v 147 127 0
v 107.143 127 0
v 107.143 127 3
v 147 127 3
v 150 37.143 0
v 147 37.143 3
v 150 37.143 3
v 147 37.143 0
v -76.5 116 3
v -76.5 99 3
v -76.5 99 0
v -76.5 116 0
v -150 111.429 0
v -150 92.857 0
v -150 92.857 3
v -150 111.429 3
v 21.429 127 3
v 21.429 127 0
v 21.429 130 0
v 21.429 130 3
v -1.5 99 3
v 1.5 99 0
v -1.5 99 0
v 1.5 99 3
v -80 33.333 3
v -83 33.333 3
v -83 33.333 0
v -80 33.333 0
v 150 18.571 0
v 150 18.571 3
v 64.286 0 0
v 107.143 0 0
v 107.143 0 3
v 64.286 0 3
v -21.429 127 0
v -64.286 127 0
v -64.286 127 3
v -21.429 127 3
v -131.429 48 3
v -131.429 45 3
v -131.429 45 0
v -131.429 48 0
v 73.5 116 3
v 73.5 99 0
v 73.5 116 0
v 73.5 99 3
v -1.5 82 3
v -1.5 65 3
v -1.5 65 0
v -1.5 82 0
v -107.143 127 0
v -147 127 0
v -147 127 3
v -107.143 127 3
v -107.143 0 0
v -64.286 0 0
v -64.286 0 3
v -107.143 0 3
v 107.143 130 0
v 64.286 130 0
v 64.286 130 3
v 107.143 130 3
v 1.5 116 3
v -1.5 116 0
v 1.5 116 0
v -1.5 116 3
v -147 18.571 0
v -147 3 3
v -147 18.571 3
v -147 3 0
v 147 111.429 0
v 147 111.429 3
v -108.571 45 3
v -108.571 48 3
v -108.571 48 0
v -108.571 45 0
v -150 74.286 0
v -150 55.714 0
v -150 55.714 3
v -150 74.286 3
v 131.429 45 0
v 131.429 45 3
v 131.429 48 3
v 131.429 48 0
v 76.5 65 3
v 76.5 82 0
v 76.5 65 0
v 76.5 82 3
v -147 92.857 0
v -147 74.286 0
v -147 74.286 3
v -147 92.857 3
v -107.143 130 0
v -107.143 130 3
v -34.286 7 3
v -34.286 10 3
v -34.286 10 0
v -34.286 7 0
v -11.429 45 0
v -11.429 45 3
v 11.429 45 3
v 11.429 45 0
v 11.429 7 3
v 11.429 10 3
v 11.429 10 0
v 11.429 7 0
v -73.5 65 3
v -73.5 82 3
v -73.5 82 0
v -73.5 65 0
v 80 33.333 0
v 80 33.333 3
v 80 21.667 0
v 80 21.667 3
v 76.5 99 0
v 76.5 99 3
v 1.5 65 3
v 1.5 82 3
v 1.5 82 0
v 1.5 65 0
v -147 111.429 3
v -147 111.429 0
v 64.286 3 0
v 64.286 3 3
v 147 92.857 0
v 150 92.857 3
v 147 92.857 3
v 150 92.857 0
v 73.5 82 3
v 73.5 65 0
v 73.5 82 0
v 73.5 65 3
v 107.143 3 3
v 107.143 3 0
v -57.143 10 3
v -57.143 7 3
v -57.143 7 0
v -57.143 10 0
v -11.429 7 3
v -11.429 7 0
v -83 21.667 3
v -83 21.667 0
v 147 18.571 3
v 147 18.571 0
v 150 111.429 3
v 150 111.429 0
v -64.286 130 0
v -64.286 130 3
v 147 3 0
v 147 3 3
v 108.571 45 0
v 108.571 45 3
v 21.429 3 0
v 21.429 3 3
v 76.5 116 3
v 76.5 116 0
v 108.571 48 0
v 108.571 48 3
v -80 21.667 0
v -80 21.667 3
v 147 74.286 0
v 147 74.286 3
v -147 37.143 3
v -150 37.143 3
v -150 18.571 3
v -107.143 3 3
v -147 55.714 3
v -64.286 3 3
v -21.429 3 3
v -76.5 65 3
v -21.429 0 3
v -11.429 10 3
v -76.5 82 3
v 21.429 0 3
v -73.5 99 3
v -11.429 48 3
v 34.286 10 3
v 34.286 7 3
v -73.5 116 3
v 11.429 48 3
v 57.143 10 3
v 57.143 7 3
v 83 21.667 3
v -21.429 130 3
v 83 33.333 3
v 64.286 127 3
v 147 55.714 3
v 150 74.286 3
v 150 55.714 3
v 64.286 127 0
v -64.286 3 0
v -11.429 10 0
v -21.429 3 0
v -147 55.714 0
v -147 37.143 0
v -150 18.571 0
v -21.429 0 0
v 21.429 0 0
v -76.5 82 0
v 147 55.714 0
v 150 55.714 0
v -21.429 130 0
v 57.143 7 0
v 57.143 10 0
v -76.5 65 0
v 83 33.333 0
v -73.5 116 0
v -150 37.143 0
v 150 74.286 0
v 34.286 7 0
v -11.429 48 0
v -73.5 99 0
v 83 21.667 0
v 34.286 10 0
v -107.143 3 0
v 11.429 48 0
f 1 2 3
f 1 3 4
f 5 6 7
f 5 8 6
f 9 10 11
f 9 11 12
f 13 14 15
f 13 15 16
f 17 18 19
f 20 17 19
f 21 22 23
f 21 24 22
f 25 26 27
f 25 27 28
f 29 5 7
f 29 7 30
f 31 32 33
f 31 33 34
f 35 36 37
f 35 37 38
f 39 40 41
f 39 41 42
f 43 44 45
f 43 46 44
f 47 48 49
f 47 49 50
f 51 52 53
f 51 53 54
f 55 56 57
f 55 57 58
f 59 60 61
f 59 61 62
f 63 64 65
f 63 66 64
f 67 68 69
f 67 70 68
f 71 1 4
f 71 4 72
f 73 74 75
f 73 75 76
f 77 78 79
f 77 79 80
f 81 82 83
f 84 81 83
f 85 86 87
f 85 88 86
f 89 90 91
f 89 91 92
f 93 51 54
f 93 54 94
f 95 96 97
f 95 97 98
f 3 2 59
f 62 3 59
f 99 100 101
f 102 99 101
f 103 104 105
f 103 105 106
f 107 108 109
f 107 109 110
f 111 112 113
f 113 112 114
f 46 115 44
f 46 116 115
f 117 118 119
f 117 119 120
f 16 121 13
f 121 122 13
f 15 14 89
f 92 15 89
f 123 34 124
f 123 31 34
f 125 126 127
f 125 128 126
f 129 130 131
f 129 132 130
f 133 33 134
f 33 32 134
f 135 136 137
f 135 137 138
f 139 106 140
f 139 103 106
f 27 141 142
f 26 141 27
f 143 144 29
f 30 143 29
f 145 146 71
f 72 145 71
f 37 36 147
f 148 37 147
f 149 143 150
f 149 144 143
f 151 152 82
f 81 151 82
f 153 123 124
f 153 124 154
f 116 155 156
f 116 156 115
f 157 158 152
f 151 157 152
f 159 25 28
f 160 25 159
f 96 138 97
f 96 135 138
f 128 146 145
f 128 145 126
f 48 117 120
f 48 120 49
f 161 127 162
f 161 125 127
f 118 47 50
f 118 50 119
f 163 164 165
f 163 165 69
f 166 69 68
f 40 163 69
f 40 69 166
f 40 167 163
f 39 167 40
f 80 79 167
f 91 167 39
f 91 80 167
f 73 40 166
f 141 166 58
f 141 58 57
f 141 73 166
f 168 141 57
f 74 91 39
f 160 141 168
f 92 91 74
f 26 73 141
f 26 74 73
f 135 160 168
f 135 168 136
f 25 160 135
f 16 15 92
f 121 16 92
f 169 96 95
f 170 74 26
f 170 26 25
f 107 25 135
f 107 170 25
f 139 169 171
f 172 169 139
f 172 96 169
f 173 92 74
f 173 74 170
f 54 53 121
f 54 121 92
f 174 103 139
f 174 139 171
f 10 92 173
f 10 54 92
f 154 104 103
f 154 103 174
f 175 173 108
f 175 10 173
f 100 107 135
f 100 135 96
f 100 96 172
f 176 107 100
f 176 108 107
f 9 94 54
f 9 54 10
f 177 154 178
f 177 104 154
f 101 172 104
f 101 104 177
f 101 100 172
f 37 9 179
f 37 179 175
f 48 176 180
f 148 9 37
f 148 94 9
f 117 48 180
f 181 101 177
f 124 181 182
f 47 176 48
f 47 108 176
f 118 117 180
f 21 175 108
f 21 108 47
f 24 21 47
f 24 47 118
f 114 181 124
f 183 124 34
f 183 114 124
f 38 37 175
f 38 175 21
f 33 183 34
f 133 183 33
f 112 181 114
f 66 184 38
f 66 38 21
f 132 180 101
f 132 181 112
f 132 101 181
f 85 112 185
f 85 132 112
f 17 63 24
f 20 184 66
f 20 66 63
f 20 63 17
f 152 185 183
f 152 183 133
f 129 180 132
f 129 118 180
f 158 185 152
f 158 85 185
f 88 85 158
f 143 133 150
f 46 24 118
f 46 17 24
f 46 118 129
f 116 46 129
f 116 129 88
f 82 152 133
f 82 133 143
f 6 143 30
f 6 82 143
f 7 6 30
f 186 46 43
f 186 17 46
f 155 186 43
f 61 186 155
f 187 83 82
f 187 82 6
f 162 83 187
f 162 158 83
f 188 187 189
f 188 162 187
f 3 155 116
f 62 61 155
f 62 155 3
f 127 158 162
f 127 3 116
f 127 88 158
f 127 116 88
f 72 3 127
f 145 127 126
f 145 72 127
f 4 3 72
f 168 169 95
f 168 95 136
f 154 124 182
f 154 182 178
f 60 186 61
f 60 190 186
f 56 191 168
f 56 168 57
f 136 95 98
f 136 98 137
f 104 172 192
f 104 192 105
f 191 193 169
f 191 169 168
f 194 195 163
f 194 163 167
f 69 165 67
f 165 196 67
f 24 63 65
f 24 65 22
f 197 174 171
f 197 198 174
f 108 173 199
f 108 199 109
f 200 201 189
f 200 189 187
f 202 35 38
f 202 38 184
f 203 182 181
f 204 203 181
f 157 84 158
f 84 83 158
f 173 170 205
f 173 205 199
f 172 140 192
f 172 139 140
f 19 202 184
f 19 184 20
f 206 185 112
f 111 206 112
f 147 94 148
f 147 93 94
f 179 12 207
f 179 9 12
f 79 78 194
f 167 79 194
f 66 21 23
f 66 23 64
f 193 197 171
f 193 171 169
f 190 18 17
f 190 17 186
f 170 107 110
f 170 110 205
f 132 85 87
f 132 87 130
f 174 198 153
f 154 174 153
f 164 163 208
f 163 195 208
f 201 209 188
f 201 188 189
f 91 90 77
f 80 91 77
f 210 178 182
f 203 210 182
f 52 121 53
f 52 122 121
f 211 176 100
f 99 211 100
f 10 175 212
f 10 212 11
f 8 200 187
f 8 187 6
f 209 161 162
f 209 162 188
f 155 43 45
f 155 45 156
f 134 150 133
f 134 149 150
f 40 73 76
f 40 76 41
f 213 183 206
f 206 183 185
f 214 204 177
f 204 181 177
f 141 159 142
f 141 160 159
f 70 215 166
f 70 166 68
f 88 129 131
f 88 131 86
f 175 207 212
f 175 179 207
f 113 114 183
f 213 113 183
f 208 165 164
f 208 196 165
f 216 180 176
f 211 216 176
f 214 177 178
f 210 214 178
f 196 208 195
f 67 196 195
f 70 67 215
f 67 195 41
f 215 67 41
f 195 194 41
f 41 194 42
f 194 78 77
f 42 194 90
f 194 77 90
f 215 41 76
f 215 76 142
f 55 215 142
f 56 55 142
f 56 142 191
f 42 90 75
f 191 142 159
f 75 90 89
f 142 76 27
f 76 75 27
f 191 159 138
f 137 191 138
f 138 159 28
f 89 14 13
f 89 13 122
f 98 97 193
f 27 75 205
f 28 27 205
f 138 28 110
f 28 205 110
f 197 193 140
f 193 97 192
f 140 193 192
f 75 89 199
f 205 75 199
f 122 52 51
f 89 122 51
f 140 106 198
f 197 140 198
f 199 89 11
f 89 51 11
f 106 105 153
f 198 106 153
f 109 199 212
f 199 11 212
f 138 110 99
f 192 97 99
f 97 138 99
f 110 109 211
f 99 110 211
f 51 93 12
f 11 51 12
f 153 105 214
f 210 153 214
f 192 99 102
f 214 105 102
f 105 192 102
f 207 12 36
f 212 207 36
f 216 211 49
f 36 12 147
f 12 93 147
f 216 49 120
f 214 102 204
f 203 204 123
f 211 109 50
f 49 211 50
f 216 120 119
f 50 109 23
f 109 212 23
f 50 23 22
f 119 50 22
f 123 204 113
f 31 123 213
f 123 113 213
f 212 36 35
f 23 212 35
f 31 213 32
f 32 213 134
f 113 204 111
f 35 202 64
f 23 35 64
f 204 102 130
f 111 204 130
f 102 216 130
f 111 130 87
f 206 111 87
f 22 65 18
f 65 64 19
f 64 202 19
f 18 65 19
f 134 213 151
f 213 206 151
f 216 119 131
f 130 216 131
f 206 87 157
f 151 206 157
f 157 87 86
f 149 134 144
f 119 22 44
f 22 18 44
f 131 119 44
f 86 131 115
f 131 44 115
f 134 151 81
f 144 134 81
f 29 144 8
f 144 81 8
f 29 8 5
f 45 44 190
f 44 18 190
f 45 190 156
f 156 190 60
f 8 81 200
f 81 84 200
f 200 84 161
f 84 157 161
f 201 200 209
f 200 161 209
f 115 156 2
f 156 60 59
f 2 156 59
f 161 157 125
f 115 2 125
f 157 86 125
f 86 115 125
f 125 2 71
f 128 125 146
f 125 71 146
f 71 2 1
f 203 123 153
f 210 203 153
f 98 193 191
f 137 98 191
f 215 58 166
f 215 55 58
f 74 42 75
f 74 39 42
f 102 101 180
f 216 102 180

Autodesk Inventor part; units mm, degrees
ref_plane "YZ Plane" through (0, 0, 0) normal (1, 0, 0) x (0, 1, 0)
ref_plane "XZ Plane" through (0, 0, 0) normal (0, 1, 0) x (-1, 0, 0)
ref_plane "XY Plane" through (0, 0, 0) normal (0, 0, 1) x (1, 0, 0)
sketch "Sketch1" plane through (0, 0, 0) normal (0, 0, 1) x (1, 0, 0)
  line L0 (-150, 18.5714) -> (-147, 18.5714)
  line L1 (-147, 37.1429) -> (-150, 37.1429)
  line L2 (-150, 55.7143) -> (-147, 55.7143)
  line L3 (-147, 74.2857) -> (-150, 74.2857)
  line L4 (-150, 92.8571) -> (-147, 92.8571)
  line L5 (-147, 111.4286) -> (-150, 111.4286)
  line L6 (147, 18.5714) -> (150, 18.5714)
  line L7 (147, 37.1429) -> (150, 37.1429)
  line L8 (150, 55.7143) -> (147, 55.7143)
  line L9 (147, 74.2857) -> (150, 74.2857)
  line L10 (150, 92.8571) -> (147, 92.8571)
  line L11 (150, 111.4286) -> (147, 111.4286)
  line L12 (-107.1429, 0) -> (-107.1429, 3)
  line L13 (-64.2857, 3) -> (-64.2857, 0)
  line L14 (-21.4286, 0) -> (-21.4286, 3)
  line L15 (21.4286, 0) -> (21.4286, 3)
  line L16 (64.2857, 0) -> (64.2857, 3)
  line L17 (107.1429, 0) -> (107.1429, 3)
  line L18 (-107.1429, 127) -> (-107.1429, 130)
  line L19 (-64.2857, 127) -> (-64.2857, 130)
  line L20 (-21.4286, 127) -> (-21.4286, 130)
  line L21 (21.4286, 127) -> (21.4286, 130)
  line L22 (64.2857, 127) -> (64.2857, 130)
  line L23 (107.1429, 127) -> (107.1429, 130)
  line L24 (-107.1429, 3) -> (-147, 3)
  line L25 (-147, 3) -> (-147, 18.5714)
  line L26 (-147, 37.1429) -> (-147, 55.7143)
  line L27 (-147, 74.2857) -> (-147, 92.8571)
  line L28 (-147, 111.4286) -> (-147, 127)
  line L29 (-147, 127) -> (-107.1429, 127)
  line L30 (-64.2857, 127) -> (-21.4286, 127)
  line L31 (21.4286, 127) -> (64.2857, 127)
  line L32 (107.1429, 127) -> (147, 127)
  line L33 (-21.4286, 3) -> (-64.2857, 3)
  line L34 (147, 3) -> (107.1429, 3)
  line L35 (64.2857, 3) -> (21.4286, 3)
  line L36 (-150, 92.8571) -> (-150, 111.4286)
  line L37 (-150, 18.5714) -> (-150, 37.1429)
  line L38 (-150, 55.7143) -> (-150, 74.2857)
  line L39 (-64.2857, 0) -> (-107.1429, 0)
  line L40 (107.1429, 0) -> (64.2857, 0)
  line L41 (21.4286, 0) -> (-21.4286, 0)
  line L42 (-107.1429, 130) -> (-64.2857, 130)
  line L43 (-21.4286, 130) -> (21.4286, 130)
  line L44 (64.2857, 130) -> (107.1429, 130)
  line L45 (150, 37.1429) -> (150, 18.5714)
  line L46 (150, 111.4286) -> (150, 92.8571)
  line L47 (150, 74.2857) -> (150, 55.7143)
  line L48 (147, 127) -> (147, 111.4286)
  line L49 (147, 92.8571) -> (147, 74.2857)
  line L50 (147, 55.7143) -> (147, 37.1429)
  line L51 (147, 18.5714) -> (147, 3)
  point P0 (0, 0)
  dimension "d1" = 300
  dimension "d5" = 42.8571
  dimension "d6" = 150
  dimension "d7" = 85.7143
  dimension "d8" = 128.5714
  dimension "d9" = 171.4286
  dimension "d10" = 214.2857
  dimension "d11" = 257.1429
  dimension "d12" = 130
  dimension "d13" = 18.5714
  dimension "d14" = 0
  dimension "d15" = 3
  dimension "d16" = 37.1429
  dimension "d17" = 55.7143
  dimension "d18" = 74.2857
  dimension "d19" = 92.8571
  dimension "d20" = 111.4286
  dimension "d21" = 124
  dimension "d22" = 3
  dimension "d23" = 3
extrude "Extrusion1" add sketch "Sketch1" along normal blind 3
sketch "Sketch2" plane through (0, 0, 3) normal (0, 0, 1) x (1, 0, 0)
  line L0 (-108.5714, 45) -> (-131.4286, 45)
  line L1 (-131.4286, 45) -> (-131.4286, 48)
  line L2 (-131.4286, 48) -> (-108.5714, 48)
  line L3 (-108.5714, 48) -> (-108.5714, 45)
  line L4 (-11.4286, 45) -> (11.4286, 45)
  line L5 (11.4286, 45) -> (11.4286, 48)
  line L6 (11.4286, 48) -> (-11.4286, 48)
  line L7 (-11.4286, 48) -> (-11.4286, 45)
  line L8 (108.5714, 45) -> (131.4286, 45)
  line L9 (131.4286, 45) -> (131.4286, 48)
  line L10 (131.4286, 48) -> (108.5714, 48)
  line L11 (108.5714, 48) -> (108.5714, 45)
  line L12 (-21.4286, 0) -> (21.4286, 0) projected
  line L13 (-11.4286, 10) -> (11.4286, 10)
  line L14 (11.4286, 10) -> (11.4286, 7)
  line L15 (11.4286, 7) -> (-11.4286, 7)
  line L16 (-11.4286, 7) -> (-11.4286, 10)
  line L17 (34.2857, 7) -> (57.1429, 7)
  line L18 (57.1429, 7) -> (57.1429, 10)
  line L19 (57.1429, 10) -> (34.2857, 10)
  line L20 (34.2857, 10) -> (34.2857, 7)
  line L21 (-34.2857, 7) -> (-57.1429, 7)
  line L22 (-57.1429, 7) -> (-57.1429, 10)
  line L23 (-57.1429, 10) -> (-34.2857, 10)
  line L24 (-34.2857, 10) -> (-34.2857, 7)
  line L25 (-80, 21.6667) -> (-83, 21.6667)
  line L26 (-83, 21.6667) -> (-83, 33.3333)
  line L27 (-83, 33.3333) -> (-80, 33.3333)
  line L28 (-80, 33.3333) -> (-80, 21.6667)
  line L29 (80, 21.6667) -> (83, 21.6667)
  line L30 (83, 21.6667) -> (83, 33.3333)
  line L31 (83, 33.3333) -> (80, 33.3333)
  line L32 (80, 33.3333) -> (80, 21.6667)
  point P0 (0, 0)
  point P1 (-120, 45)
  point P2 (120, 45)
  dimension "d26" = 22.8571
  dimension "d27" = 48
  dimension "d28" = 3
  dimension "d29" = 120
  dimension "d30" = 120
  dimension "d31" = 11.4286
  dimension "d34" = 7
  dimension "d35" = 3
  dimension "d36" = 22.8571
  dimension "d37" = 22.8571
  dimension "d38" = 3
  dimension "d39" = 3
  dimension "d40" = 11.6667
  dimension "d41" = 11.6667
  dimension "d42" = 22.8571
  dimension "d43" = 22.8571
extrude "Extrusion2" cut sketch "Sketch2" against normal through all
sketch "Sketch3" plane through (0, 0, 3) normal (0, 0, 1) x (1, 0, 0)
  line L0 (-76.5, 116) -> (-73.5, 116)
  line L1 (-73.5, 116) -> (-73.5, 99)
  line L2 (-73.5, 99) -> (-76.5, 99)
  line L3 (-76.5, 99) -> (-76.5, 116)
  line L4 (-76.5, 82) -> (-73.5, 82)
  line L5 (-73.5, 82) -> (-73.5, 65)
  line L6 (-73.5, 65) -> (-76.5, 65)
  line L7 (-76.5, 65) -> (-76.5, 82)
  line L8 (-21.4286, 127) -> (-64.2857, 127) projected
  line L9 (-64.2857, 127) -> (-73.5, 127) construction
  line L10 (-73.5, 127) -> (-73.5, 116) construction
  line L11 (-73.5, 99) -> (-73.5, 82) construction
  line L12 (-108.5714, 48) -> (-73.5, 48) construction
  line L13 (-73.5, 48) -> (-73.5, 65) construction
  point P0 (0, 0)
  dimension "d44" = 17
  dimension "d45" = 3
  dimension "d46" = 73.5
  dimension "d52" = 17
extrude "Extrusion3" cut sketch "Sketch3" against normal through all
pattern_linear "Rectangular Pattern1" count 3 spacing 75 along (1, 0, 0) of "Extrusion3"
equation "\"d1\" = wt"
equation "\"d5\" = 0.142857 * wt - tol"
equation "\"d6\" = 0.5 * wt"
equation "\"d7\" = 0.285714 * wt + tol"
equation "\"d8\" = 0.428571 * wt - tol"
equation "\"d9\" = 0.571429 * wt + tol"
equation "\"d10\" = 0.714286 * wt - tol"
equation "\"d11\" = 0.857143 * wt + tol"
equation "\"d12\" = height_back"
equation "\"d13\" = 0.142857 * height_back - tol"
equation "\"d15\" = tt"
equation "\"d16\" = 0.285714 * height_back + tol"
equation "\"d17\" = 0.428571 * height_back - tol"
equation "\"d18\" = 0.571429 * height_back + tol"
equation "\"d19\" = 0.714286 * height_back - tol"
equation "\"d20\" = 0.857143 * height_back + tol"
equation "\"d21\" = -2 * tt + height_back"
equation "\"d22\" = tt"
equation "\"d23\" = tt"
equation "\"d24\" = tt"
equation "\"d26\" = 0.142857 * shelfW + 2 * tol"
equation "\"d28\" = tt"
equation "\"d29\" = 0.4 * wt"
equation "\"d30\" = 0.4 * wt"
equation "\"d31\" = 0.0714286 * shelfW + tol"
equation "\"d35\" = tt"
equation "\"d36\" = 0.142857 * shelfW - 2 * tol"
equation "\"d37\" = 0.142857 * shelfW - 2 * tol"
equation "\"d38\" = tt"
equation "\"d39\" = tt"
equation "\"d40\" = 0.333333 * shelfH + 2 * tol"
equation "\"d41\" = 0.333333 * shelfH - tol"
equation "\"d42\" = 0.142857 * shelfW - tol"
equation "\"d43\" = 0.142857 * shelfW - tol"
equation "\"d45\" = tt"
equation "\"d46\" = 0.25 * wt - 0.5 * tt"
equation "\"d51\" = 0.25 * wt"
equation "\"wt\" = 300"
equation "\"tt\" = 3"
equation "\"tol\" = 0"
equation "\"height_back\" = 130"
equation "\"d4\" = tt"
equation "\"tiroir\" = 1"
equation "\"nHoles\" = 4"
equation "\"shelfH\" = 35"
equation "\"shelfW\" = 160"
properties part number "back"
